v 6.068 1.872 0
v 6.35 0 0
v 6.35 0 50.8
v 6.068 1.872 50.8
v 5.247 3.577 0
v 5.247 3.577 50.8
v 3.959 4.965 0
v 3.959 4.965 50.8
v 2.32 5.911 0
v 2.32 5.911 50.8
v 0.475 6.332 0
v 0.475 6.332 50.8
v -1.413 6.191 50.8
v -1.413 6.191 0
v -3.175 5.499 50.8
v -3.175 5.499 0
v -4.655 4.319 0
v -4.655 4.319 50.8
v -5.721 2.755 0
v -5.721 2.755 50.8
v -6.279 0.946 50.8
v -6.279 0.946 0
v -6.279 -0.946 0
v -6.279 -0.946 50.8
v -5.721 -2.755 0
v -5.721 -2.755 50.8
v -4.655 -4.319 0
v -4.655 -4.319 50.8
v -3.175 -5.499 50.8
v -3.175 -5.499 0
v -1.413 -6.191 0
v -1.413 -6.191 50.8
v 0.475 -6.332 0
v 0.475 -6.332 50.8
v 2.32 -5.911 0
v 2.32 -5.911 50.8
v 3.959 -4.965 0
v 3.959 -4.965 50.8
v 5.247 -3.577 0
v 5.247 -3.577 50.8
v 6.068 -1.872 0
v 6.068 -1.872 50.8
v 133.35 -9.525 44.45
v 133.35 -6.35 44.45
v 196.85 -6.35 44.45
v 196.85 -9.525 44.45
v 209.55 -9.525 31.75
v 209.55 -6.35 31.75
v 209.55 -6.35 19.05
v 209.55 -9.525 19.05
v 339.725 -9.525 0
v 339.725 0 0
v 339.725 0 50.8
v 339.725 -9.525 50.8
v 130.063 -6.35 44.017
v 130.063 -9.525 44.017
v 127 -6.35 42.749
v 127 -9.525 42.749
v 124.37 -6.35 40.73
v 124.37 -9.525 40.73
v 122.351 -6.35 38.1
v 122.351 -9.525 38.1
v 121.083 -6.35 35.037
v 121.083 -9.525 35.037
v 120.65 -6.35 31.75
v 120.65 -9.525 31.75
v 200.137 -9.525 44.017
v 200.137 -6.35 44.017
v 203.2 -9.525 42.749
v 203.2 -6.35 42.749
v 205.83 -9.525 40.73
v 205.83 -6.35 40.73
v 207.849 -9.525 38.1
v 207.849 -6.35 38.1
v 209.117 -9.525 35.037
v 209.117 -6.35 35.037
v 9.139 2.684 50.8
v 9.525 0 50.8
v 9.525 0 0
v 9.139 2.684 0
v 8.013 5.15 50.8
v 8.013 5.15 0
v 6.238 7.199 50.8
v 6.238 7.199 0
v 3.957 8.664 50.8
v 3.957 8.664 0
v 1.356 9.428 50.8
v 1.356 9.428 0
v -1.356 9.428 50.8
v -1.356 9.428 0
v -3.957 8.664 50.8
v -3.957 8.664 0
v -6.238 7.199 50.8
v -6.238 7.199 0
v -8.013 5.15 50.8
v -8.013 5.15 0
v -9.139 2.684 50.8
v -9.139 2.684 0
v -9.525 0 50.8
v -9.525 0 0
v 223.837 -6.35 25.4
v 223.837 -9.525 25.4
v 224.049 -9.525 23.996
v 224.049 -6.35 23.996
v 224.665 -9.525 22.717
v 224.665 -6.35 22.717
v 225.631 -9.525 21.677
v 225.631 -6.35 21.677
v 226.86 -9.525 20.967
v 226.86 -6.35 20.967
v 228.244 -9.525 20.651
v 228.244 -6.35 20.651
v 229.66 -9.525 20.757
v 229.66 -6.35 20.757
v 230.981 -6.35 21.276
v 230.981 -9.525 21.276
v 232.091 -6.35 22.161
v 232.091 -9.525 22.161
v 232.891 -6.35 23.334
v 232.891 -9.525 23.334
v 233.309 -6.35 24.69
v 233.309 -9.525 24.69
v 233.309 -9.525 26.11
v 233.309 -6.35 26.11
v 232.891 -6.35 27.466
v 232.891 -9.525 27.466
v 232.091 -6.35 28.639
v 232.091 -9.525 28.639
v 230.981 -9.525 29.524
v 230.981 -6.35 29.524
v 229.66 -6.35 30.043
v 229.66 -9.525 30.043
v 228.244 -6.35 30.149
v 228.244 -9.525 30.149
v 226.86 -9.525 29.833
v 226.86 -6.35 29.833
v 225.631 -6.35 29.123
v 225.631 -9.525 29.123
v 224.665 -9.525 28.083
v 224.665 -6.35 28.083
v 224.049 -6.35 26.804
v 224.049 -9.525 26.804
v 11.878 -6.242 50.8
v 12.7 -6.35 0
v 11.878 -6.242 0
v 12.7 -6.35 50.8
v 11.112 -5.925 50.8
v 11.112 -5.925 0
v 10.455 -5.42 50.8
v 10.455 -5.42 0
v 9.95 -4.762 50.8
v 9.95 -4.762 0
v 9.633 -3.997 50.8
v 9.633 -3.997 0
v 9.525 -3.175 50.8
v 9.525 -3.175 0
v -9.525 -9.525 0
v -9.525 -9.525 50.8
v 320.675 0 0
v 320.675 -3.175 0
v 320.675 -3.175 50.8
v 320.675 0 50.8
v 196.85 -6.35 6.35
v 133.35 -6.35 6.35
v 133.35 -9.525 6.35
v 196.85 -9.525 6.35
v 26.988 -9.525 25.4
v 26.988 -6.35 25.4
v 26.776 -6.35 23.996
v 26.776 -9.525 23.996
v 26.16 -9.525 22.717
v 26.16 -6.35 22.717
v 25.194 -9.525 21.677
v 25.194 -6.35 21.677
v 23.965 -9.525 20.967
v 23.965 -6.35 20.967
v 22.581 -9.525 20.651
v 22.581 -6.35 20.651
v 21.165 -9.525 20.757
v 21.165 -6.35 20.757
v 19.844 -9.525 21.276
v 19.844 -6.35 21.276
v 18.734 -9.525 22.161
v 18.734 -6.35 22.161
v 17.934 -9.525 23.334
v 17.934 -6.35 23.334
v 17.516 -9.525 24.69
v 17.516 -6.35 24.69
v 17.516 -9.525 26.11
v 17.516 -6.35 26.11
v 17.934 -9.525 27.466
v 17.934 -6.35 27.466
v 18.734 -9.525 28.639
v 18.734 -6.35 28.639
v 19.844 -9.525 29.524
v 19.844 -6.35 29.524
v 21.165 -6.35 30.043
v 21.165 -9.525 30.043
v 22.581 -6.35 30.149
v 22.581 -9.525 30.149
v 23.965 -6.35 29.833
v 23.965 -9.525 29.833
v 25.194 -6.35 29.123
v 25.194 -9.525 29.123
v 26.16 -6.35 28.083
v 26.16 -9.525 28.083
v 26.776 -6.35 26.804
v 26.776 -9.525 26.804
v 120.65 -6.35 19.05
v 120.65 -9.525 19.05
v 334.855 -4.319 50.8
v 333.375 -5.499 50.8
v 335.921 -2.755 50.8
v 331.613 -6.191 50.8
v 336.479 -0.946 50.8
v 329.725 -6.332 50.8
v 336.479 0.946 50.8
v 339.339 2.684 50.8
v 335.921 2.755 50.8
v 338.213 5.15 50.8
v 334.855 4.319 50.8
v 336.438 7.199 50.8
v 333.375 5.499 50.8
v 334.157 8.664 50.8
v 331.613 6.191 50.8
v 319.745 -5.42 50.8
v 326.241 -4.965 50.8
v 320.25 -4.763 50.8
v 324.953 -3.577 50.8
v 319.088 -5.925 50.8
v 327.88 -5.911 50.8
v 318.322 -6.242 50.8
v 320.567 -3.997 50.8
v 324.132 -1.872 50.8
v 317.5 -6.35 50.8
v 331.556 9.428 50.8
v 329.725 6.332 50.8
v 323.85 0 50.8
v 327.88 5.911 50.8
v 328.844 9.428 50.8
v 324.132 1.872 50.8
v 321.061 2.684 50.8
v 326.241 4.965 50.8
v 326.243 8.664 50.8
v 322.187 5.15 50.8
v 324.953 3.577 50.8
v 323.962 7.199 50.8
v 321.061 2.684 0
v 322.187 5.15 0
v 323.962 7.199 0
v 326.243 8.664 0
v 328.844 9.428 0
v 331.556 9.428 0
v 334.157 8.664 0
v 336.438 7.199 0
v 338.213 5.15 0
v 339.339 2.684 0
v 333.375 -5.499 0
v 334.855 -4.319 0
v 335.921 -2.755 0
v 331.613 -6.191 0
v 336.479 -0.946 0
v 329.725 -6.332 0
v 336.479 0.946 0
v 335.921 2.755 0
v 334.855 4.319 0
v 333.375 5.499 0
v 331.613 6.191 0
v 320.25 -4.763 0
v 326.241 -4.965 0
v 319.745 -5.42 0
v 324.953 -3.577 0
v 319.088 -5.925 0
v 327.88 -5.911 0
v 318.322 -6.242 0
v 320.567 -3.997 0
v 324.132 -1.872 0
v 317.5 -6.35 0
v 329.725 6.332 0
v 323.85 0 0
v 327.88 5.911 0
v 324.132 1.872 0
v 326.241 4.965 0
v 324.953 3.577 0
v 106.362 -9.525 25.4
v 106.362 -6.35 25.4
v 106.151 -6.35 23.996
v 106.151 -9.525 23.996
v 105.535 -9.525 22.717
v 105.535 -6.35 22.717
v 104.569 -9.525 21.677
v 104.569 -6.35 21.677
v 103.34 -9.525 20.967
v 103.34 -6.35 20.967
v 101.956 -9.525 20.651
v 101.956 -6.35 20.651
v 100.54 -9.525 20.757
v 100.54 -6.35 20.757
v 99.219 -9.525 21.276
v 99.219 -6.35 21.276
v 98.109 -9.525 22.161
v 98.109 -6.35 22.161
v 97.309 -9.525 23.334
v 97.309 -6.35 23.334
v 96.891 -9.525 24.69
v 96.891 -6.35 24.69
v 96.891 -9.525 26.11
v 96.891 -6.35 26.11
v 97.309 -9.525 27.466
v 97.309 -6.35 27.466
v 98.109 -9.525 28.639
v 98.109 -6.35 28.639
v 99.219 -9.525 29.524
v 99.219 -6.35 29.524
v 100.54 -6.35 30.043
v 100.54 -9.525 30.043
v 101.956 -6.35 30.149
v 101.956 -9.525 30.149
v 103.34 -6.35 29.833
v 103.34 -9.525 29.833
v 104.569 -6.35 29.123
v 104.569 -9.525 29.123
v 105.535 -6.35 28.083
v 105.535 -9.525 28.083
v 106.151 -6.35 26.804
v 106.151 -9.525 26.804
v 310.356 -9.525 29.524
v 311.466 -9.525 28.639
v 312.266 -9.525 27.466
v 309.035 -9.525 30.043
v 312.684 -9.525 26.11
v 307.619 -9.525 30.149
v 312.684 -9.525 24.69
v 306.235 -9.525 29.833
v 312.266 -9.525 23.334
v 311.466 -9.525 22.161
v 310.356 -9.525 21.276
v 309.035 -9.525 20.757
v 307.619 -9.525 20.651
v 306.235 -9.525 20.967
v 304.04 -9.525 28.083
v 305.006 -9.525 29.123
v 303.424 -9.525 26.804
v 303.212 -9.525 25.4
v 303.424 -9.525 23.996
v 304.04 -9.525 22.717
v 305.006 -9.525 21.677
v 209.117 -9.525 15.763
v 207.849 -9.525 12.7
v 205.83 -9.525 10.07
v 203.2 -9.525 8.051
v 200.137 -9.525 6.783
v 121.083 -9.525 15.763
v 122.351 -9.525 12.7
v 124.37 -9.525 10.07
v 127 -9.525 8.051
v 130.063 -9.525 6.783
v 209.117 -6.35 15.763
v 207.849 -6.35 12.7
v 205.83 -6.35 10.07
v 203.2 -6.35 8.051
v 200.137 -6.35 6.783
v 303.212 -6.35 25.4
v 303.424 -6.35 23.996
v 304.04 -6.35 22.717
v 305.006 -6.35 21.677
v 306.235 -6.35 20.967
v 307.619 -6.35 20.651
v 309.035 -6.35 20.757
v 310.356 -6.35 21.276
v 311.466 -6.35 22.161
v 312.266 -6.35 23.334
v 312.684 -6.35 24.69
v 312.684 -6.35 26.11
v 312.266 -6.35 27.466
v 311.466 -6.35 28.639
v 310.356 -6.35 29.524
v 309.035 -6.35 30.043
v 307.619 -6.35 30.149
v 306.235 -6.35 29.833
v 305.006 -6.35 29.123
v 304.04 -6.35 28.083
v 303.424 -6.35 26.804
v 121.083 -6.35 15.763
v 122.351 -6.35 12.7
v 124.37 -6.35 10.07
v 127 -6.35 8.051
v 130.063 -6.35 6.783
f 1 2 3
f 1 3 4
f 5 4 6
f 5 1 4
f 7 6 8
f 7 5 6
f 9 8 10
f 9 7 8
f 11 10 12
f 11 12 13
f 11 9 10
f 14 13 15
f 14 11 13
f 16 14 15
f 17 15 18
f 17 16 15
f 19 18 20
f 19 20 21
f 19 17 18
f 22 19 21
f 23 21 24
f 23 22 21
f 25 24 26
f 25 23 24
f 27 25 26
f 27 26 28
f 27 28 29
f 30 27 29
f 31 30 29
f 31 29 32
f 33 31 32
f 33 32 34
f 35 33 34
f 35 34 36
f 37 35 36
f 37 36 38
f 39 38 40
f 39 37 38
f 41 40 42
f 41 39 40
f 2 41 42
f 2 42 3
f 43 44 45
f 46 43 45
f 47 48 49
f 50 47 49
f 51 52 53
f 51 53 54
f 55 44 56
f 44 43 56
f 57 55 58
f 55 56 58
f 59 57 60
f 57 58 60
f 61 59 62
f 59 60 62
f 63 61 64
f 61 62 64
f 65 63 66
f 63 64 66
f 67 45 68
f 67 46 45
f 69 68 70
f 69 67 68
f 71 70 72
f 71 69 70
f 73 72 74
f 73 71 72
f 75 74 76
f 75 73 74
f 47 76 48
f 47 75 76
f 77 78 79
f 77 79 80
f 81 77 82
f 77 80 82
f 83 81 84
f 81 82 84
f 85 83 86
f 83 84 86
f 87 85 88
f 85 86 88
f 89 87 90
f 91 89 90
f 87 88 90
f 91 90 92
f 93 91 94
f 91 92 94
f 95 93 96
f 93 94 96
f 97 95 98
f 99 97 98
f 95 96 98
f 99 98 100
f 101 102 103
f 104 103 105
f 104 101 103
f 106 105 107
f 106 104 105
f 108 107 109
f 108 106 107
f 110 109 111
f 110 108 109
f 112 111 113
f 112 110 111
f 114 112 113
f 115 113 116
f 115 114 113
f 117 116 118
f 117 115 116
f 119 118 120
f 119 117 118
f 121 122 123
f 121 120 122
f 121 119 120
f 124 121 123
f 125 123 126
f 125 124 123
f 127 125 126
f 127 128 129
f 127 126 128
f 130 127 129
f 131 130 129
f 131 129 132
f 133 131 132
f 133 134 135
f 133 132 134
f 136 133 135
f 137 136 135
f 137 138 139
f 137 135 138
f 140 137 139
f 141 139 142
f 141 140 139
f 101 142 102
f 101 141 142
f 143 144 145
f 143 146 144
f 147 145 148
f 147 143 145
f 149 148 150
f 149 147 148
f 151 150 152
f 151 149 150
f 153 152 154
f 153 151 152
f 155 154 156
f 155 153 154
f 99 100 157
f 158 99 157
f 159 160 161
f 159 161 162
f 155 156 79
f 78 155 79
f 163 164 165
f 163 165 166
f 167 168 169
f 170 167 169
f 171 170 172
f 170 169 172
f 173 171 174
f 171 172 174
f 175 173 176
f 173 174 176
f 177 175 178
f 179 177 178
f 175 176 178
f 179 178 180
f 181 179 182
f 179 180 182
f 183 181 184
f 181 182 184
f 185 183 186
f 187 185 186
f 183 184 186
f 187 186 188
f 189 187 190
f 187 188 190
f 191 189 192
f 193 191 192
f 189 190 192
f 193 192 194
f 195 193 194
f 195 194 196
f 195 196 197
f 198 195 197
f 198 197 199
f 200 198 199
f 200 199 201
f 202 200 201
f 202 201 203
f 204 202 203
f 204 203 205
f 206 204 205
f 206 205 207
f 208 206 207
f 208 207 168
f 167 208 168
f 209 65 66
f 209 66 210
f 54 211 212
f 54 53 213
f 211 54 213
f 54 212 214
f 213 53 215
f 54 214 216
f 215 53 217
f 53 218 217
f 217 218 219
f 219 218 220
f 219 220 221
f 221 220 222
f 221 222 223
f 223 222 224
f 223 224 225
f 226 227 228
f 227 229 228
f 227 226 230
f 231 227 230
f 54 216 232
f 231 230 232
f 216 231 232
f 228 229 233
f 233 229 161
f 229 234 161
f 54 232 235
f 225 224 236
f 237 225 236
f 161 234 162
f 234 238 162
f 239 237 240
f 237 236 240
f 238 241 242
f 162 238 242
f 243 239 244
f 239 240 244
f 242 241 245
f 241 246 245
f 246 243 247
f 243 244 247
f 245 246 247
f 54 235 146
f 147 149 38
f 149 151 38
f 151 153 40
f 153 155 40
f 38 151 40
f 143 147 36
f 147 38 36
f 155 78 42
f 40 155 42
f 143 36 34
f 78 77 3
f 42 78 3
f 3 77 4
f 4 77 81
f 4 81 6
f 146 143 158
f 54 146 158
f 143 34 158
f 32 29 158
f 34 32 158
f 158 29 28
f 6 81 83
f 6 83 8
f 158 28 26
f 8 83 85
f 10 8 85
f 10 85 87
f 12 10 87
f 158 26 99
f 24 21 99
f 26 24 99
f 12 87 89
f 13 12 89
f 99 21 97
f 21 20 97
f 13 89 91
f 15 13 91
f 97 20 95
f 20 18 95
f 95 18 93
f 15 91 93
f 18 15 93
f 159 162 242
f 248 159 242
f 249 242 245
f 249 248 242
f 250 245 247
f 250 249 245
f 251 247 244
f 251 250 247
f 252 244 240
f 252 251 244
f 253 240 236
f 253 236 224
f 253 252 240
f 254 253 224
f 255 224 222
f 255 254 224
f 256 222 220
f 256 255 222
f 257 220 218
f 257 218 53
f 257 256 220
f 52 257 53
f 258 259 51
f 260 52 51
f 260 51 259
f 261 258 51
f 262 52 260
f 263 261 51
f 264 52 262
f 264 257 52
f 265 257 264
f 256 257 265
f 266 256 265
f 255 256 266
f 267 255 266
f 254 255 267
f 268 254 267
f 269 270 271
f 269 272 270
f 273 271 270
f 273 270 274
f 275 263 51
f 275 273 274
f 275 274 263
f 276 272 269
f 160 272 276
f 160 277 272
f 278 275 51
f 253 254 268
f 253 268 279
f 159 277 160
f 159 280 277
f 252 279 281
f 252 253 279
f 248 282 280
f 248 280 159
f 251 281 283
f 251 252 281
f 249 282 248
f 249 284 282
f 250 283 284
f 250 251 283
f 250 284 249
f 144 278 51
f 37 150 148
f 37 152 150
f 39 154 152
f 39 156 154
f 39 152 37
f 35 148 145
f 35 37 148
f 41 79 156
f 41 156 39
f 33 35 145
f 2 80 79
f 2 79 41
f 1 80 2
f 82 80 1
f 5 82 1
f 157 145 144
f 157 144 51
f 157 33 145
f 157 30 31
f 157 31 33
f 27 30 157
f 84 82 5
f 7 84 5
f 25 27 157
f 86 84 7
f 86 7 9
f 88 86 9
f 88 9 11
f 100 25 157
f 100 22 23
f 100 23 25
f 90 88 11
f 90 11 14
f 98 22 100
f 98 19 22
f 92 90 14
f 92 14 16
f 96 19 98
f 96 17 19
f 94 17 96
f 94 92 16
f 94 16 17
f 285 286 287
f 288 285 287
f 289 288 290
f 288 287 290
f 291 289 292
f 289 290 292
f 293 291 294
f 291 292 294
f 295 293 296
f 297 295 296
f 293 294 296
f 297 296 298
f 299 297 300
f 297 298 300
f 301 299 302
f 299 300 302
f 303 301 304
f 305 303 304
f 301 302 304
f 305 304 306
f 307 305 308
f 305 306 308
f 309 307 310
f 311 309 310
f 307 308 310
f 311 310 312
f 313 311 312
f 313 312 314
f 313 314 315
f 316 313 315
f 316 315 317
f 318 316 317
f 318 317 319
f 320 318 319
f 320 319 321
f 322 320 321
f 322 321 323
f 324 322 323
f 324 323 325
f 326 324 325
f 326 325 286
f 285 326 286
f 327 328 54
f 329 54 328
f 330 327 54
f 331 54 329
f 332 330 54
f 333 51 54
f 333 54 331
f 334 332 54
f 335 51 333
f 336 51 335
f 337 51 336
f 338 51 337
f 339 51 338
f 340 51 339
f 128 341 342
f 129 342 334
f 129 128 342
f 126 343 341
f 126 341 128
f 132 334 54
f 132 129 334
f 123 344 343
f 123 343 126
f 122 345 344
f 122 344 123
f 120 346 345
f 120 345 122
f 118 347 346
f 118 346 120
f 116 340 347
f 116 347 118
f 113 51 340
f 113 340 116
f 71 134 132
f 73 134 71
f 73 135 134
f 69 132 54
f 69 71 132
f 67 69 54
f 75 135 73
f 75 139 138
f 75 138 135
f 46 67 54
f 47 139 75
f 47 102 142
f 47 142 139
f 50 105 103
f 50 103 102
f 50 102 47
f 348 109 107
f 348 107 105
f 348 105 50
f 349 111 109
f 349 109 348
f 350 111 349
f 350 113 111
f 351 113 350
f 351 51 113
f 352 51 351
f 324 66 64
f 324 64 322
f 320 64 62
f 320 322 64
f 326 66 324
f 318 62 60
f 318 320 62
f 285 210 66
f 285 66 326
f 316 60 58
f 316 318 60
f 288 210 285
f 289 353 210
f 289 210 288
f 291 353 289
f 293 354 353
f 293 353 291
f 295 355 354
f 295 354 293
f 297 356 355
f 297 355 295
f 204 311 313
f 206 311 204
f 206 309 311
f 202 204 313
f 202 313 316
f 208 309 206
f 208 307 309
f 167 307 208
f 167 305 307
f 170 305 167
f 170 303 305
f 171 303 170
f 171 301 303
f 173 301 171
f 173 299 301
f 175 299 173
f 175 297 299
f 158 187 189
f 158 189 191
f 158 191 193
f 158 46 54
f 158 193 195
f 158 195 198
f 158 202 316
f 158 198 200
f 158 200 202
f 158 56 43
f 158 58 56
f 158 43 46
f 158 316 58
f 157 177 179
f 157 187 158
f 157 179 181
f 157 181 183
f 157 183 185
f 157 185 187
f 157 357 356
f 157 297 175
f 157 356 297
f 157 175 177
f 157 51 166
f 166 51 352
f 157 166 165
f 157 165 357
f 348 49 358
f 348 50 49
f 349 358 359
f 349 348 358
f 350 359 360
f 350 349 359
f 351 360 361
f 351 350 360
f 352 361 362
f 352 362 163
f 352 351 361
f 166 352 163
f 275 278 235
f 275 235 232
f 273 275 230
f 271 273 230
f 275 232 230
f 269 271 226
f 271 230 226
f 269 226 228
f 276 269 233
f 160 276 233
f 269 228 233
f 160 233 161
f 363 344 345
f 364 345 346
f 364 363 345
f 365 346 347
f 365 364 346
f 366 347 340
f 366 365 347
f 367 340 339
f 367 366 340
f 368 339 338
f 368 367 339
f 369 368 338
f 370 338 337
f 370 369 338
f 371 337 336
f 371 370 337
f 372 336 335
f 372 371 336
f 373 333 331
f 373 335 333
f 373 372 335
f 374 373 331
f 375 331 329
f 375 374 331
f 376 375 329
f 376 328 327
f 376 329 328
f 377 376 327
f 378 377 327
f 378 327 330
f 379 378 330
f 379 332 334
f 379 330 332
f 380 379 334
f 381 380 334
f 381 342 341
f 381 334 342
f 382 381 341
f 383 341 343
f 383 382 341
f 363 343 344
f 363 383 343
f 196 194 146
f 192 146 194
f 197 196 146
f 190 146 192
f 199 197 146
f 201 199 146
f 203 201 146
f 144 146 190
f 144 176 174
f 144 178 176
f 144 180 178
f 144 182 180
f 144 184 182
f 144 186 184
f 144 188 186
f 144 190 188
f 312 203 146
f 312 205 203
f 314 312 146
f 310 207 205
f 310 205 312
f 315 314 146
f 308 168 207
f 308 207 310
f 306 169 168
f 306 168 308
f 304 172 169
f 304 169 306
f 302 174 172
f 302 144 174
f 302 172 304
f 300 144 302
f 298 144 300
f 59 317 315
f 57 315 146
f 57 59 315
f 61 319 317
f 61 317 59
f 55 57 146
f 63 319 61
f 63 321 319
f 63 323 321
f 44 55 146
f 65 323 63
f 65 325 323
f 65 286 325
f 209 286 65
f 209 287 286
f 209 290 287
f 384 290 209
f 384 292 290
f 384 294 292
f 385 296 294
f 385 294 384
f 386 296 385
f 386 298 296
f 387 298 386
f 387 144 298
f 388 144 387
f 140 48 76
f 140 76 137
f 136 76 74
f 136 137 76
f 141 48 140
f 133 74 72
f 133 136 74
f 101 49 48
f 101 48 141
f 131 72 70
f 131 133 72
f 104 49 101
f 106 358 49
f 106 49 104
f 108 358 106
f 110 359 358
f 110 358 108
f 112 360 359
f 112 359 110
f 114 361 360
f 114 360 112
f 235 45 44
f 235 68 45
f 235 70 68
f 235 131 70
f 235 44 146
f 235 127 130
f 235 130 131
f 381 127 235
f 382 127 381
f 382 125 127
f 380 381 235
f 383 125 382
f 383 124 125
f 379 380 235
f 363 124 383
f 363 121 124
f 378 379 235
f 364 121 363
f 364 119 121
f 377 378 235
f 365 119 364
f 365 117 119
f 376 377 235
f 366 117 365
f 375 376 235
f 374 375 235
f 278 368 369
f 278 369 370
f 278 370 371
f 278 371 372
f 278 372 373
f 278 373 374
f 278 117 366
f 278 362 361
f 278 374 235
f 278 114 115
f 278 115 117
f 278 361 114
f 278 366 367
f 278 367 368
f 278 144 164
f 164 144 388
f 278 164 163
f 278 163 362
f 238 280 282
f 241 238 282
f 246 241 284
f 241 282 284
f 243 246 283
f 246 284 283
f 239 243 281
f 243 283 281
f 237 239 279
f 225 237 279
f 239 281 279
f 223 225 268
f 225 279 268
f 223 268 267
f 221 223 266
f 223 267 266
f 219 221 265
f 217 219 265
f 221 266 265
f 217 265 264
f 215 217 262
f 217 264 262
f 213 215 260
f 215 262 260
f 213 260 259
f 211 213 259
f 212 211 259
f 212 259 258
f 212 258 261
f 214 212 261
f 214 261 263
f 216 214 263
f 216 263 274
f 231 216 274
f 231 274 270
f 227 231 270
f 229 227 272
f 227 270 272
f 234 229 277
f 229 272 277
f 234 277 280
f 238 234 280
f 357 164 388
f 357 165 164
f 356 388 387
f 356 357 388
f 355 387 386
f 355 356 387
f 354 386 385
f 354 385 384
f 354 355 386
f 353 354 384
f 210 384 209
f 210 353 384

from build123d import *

# Parameters (mm, degrees)
SKETCH1_R           = 6.35
BOSS_EXTRUDE1_DEPTH = 50.8
SKETCH6_R           = 4.7625
CUT_EXTRUDE3_DEPTH  = 12.7
SKETCH7_W           = 88.9
SKETCH7_H           = 38.1
CUT_EXTRUDE4_DEPTH  = 4.175
FILLET1_R           = 12.7
FILLET2_R           = 3.175


with BuildPart() as part:
    # Sketch1 → Boss-Extrude1 (new body)
    with BuildSketch(Plane.XY):
        with BuildLine():
            ThreePointArc((9.525, 0), (0, 9.525), (-9.525, 0))
            Line((-9.525, 0), (-9.525, -9.525))
            Line((-9.525, -9.525), (165.1, -9.525))
            Line((165.1, -9.525), (165.1, -6.35))
            Line((165.1, -6.35), (9.525, -6.35))
            Line((9.525, -6.35), (9.525, 0))
        make_face()
        Circle(SKETCH1_R, mode=Mode.SUBTRACT)
    boss_extrude1 = extrude(amount=BOSS_EXTRUDE1_DEPTH)

    # Sketch6 → Cut-Extrude3 (cut)
    with BuildSketch(Plane(origin=(0, -6.35, 0), x_dir=(1, 0, 0), z_dir=(0, 1, 0))):
        with Locations((22.225, -25.4)):
            Circle(SKETCH6_R)
        with Locations((101.6, -25.4)):
            Circle(SKETCH6_R)
    cut_extrude3 = extrude(amount=-CUT_EXTRUDE3_DEPTH, mode=Mode.SUBTRACT)

    # Mirror1: Boss-Extrude1, Cut-Extrude3 across plane
    add(boss_extrude1.mirror(Plane(origin=(165.1, 0, 50.8), x_dir=(0, 0, 1), z_dir=(1, 0, 0))))
    add(cut_extrude3.mirror(Plane(origin=(165.1, 0, 50.8), x_dir=(0, 0, 1), z_dir=(1, 0, 0))), mode=Mode.SUBTRACT)

    # Sketch7 → Cut-Extrude4 (cut, through all)
    with BuildSketch(Plane(origin=(0, -6.35, 0), x_dir=(1, 0, 0), z_dir=(0, 1, 0))):
        with Locations((165.1, -25.4)):
            Rectangle(SKETCH7_W, SKETCH7_H)
    extrude(amount=-CUT_EXTRUDE4_DEPTH, mode=Mode.SUBTRACT)

    # Fillet1
    fillet1_edges = [part.edges().sort_by_distance(p)[0] for p in [
        (120.65, -7.9375, 44.45),
        (120.65, -7.9375, 6.35),
        (209.55, -7.9375, 6.35),
        (209.55, -7.9375, 44.45),
    ]]
    fillet(fillet1_edges, radius=FILLET1_R)

    # Fillet2
    fillet2_edges = [part.edges().sort_by_distance(p)[0] for p in [
        (9.525, -6.35, 25.4),
        (320.675, -6.35, 25.4),
    ]]
    fillet(fillet2_edges, radius=FILLET2_R)


solid = part.part
